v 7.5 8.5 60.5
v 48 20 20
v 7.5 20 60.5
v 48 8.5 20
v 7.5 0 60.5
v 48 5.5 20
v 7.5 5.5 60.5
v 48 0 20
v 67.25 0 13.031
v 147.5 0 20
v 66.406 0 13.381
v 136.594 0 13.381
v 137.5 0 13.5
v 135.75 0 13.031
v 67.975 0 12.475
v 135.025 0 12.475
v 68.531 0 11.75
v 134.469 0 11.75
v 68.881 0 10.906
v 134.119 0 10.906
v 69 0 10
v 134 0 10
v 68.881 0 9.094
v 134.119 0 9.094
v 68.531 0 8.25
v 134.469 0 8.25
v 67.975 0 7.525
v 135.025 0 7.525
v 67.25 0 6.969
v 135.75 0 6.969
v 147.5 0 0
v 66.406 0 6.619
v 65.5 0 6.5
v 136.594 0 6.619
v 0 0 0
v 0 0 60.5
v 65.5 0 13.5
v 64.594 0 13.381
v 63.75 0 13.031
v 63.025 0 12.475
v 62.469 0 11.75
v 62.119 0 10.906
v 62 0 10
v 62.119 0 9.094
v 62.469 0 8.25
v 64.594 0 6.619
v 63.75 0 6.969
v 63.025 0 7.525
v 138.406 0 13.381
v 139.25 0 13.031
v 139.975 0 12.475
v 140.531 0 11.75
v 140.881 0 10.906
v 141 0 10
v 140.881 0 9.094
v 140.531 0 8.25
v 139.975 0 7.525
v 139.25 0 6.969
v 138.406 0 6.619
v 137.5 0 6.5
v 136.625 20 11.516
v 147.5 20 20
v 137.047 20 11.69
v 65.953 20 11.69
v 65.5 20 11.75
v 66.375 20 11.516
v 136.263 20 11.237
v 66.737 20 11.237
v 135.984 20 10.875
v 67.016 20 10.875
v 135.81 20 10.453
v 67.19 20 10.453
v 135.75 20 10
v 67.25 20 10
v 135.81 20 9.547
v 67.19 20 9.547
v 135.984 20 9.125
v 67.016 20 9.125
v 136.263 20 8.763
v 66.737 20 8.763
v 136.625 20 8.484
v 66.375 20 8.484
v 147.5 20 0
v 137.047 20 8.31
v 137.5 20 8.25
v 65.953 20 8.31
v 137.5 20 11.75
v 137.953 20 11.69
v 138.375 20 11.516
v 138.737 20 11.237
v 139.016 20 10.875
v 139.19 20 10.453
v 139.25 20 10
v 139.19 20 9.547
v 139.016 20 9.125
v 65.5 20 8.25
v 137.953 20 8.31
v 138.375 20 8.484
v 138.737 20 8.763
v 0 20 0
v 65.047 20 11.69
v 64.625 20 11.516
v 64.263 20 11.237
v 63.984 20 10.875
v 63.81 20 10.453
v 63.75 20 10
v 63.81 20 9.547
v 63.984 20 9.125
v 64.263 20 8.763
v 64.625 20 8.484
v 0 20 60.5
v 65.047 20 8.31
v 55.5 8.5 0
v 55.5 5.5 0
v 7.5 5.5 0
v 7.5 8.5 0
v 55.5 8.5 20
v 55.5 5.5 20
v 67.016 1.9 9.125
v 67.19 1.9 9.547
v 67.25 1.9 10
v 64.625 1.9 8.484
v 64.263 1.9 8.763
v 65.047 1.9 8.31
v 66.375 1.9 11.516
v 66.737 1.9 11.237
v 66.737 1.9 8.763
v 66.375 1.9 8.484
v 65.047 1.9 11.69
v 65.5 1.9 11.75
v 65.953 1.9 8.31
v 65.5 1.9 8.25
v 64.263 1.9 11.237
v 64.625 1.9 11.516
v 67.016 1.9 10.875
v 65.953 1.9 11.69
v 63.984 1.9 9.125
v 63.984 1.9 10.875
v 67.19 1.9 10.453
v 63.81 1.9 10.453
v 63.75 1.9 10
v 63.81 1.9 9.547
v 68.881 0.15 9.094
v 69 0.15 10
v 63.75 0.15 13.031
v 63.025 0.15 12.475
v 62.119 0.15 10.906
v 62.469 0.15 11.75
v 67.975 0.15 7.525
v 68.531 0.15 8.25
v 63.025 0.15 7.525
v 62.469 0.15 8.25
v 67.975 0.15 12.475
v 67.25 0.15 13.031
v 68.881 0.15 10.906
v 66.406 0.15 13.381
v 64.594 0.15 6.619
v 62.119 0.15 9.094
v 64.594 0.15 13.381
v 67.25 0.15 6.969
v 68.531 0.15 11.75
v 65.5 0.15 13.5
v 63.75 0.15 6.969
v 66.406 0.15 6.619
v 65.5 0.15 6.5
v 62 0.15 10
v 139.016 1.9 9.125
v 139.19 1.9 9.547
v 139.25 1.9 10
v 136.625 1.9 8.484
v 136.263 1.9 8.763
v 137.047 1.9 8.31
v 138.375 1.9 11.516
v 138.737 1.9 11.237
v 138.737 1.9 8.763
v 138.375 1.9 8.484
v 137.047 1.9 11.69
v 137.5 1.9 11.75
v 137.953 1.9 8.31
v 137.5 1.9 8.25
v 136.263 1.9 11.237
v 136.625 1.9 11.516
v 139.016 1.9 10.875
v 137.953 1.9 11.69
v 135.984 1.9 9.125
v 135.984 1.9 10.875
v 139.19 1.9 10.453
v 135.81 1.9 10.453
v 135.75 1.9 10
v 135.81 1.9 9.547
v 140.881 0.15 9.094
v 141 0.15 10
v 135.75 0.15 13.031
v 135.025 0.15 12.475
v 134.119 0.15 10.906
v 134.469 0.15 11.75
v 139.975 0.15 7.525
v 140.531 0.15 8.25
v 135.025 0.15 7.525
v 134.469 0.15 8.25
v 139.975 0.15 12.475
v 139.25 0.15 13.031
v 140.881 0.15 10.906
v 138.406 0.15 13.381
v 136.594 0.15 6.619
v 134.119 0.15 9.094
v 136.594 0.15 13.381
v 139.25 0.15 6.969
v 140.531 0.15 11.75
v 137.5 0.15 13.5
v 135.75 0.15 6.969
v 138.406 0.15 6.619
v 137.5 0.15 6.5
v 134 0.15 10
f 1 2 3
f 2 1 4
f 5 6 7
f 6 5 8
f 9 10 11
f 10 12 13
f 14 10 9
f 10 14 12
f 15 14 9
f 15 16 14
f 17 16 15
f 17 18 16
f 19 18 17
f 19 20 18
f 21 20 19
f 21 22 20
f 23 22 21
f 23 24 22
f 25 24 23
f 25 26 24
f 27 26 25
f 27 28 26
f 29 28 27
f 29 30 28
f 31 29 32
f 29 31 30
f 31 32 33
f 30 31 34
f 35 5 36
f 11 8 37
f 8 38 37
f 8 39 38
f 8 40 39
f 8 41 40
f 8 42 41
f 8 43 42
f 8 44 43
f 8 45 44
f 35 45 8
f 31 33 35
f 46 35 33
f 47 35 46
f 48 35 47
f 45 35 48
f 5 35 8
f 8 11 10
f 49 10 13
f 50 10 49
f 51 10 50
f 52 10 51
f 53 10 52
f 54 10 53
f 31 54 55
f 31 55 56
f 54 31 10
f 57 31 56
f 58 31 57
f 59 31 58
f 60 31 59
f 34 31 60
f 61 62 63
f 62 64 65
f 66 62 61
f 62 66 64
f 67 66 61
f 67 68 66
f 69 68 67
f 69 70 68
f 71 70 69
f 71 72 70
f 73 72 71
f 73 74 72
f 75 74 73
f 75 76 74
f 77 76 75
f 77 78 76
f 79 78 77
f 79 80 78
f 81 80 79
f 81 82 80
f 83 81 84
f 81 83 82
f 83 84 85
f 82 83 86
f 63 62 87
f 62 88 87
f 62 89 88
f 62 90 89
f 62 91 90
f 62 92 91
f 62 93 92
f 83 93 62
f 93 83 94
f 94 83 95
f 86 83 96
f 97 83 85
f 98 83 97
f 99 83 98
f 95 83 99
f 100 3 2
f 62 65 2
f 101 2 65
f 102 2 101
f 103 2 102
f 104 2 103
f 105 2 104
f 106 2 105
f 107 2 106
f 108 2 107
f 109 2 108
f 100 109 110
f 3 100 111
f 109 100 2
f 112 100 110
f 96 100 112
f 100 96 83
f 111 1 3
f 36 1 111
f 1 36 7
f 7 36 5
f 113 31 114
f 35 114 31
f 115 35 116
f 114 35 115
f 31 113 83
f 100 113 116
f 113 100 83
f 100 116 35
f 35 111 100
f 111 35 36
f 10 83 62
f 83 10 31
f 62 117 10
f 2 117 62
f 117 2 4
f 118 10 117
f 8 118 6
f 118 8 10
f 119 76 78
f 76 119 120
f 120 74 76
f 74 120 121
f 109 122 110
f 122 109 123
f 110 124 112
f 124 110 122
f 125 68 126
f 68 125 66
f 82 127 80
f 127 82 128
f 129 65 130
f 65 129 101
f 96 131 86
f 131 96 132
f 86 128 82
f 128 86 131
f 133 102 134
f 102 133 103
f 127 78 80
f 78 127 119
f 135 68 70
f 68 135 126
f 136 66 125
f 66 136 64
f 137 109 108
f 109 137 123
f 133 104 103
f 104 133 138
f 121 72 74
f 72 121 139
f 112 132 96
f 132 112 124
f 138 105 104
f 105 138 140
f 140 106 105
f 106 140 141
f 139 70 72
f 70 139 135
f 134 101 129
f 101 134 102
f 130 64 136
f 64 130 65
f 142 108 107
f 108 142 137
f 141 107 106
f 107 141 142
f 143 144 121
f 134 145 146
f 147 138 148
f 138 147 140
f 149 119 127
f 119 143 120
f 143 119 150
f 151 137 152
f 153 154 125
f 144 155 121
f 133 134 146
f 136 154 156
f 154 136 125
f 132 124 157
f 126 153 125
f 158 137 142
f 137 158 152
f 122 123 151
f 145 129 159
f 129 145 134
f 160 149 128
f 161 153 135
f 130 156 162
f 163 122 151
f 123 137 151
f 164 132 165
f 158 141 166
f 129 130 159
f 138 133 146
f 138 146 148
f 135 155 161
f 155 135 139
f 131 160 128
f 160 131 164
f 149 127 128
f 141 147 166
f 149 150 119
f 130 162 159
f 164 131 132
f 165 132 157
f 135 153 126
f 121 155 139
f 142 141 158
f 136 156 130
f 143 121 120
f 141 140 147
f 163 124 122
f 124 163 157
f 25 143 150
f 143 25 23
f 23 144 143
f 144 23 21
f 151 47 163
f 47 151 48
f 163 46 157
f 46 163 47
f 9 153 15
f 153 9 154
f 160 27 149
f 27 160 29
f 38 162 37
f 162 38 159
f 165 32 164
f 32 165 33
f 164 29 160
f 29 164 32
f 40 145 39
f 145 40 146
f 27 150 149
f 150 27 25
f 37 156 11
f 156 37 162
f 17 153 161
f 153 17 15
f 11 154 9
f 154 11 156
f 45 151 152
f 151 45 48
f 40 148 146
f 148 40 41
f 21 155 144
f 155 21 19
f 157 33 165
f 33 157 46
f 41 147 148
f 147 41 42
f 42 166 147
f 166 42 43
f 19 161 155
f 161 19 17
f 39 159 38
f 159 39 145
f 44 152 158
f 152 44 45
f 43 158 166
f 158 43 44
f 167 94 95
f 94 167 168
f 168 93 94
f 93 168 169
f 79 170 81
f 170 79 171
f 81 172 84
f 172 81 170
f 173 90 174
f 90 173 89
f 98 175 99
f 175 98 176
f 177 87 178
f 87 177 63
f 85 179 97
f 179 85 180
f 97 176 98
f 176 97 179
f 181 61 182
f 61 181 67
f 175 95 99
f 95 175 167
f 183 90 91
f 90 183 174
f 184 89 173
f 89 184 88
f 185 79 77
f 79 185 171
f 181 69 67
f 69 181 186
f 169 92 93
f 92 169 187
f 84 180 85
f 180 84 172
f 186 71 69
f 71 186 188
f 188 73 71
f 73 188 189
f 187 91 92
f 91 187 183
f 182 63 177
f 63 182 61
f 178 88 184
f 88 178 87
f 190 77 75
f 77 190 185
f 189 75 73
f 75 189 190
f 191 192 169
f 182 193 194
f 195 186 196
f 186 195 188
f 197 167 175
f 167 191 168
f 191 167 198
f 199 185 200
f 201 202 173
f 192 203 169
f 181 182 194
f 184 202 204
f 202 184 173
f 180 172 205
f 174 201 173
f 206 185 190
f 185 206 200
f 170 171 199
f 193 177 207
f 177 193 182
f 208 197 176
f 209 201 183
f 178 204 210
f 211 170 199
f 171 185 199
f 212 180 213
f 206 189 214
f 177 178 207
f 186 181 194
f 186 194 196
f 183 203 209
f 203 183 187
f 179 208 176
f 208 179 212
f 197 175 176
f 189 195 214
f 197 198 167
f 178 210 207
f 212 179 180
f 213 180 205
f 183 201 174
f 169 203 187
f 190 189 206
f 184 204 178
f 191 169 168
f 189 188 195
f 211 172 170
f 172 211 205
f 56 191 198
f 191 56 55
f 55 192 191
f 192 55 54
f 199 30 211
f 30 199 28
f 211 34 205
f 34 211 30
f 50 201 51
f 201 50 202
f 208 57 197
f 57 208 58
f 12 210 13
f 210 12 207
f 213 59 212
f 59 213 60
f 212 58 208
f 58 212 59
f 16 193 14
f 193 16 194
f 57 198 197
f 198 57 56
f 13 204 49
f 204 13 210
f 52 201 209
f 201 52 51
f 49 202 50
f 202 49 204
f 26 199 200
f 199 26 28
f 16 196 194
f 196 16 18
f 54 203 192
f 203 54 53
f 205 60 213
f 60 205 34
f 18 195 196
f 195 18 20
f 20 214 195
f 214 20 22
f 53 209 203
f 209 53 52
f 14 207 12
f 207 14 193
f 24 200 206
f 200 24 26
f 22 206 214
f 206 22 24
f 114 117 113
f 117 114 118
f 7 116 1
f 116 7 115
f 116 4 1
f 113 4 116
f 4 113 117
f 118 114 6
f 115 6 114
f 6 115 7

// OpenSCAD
// Try-square holder 3D Design

// Copyright (c) 2014 by Jeremy Bennett <jeremy.bennett@embecosm.com>

// Watering Can Rose 3D Design is licensed under a Creative Commons
// Attribution-ShareAlike 3.0 Unported License.

// You should have received a copy of the license along with this work.  If not, 
// see <http://creativecommons.org/licenses/by-sa/3.0/>.

// -----------------------------------------------------------------------------

// A screw hole with a countersink
module screwhole (bore, length) {
	iota = length / 100;
	half_length = length / 2 + iota;
	full_length = half_length * 2;
	union () {
		cylinder (d = bore, h = full_length, center = true, $fn = 24);
		translate (v = [0, 0, -half_length + bore / 4 + bore / 10])
			cylinder (d1 = bore * 2, d2 = bore, h = bore / 2, center = true, $fn = 24);
		translate (v = [0, 0, -half_length + bore / 20])
			cylinder (d = bore * 2, h = bore / 10, center = true, $fn = 24);
	}
}

		
// A screw hole for a screw parallel with the Y axis
module screwhole_y (bore, length, x_off, z_off) {
	iota = length / 100;
	translate (v = [x_off, length / 2, z_off])
		rotate (a = [-90, 0, 0])
			screwhole (bore = bore, length = length);
}


// The solid support is a block with a triangular end.
module try_square_block () {
	iota = 0.01;
	l = sqrt (68 * 68 / 2);
	union () {
		cube (size = [147.5, 20, 20], center = false);
		intersection () {
			rotate (a = [0, -45, 0])
				translate (v = [l / 2, 10, 0])
					cube (size = [l, 20, 400], center = true);
			cube (size = [68, 20, 68 - 7.5], center = false);
		}
	}
}


// Supporter for a try-square on a rack
module try_square () {
	iota = 0.01;
	difference () {
		try_square_block ();
		translate (v = [7.5, 5.5, -iota])
			cube (size = [48, 3, 400], center = false);
		screwhole_y (bore = 3.5, length = 20, x_off =  65.5, z_off = 10);
		screwhole_y (bore = 3.5, length = 20, x_off = 137.5, z_off = 10);
	}
}

try_square ();
